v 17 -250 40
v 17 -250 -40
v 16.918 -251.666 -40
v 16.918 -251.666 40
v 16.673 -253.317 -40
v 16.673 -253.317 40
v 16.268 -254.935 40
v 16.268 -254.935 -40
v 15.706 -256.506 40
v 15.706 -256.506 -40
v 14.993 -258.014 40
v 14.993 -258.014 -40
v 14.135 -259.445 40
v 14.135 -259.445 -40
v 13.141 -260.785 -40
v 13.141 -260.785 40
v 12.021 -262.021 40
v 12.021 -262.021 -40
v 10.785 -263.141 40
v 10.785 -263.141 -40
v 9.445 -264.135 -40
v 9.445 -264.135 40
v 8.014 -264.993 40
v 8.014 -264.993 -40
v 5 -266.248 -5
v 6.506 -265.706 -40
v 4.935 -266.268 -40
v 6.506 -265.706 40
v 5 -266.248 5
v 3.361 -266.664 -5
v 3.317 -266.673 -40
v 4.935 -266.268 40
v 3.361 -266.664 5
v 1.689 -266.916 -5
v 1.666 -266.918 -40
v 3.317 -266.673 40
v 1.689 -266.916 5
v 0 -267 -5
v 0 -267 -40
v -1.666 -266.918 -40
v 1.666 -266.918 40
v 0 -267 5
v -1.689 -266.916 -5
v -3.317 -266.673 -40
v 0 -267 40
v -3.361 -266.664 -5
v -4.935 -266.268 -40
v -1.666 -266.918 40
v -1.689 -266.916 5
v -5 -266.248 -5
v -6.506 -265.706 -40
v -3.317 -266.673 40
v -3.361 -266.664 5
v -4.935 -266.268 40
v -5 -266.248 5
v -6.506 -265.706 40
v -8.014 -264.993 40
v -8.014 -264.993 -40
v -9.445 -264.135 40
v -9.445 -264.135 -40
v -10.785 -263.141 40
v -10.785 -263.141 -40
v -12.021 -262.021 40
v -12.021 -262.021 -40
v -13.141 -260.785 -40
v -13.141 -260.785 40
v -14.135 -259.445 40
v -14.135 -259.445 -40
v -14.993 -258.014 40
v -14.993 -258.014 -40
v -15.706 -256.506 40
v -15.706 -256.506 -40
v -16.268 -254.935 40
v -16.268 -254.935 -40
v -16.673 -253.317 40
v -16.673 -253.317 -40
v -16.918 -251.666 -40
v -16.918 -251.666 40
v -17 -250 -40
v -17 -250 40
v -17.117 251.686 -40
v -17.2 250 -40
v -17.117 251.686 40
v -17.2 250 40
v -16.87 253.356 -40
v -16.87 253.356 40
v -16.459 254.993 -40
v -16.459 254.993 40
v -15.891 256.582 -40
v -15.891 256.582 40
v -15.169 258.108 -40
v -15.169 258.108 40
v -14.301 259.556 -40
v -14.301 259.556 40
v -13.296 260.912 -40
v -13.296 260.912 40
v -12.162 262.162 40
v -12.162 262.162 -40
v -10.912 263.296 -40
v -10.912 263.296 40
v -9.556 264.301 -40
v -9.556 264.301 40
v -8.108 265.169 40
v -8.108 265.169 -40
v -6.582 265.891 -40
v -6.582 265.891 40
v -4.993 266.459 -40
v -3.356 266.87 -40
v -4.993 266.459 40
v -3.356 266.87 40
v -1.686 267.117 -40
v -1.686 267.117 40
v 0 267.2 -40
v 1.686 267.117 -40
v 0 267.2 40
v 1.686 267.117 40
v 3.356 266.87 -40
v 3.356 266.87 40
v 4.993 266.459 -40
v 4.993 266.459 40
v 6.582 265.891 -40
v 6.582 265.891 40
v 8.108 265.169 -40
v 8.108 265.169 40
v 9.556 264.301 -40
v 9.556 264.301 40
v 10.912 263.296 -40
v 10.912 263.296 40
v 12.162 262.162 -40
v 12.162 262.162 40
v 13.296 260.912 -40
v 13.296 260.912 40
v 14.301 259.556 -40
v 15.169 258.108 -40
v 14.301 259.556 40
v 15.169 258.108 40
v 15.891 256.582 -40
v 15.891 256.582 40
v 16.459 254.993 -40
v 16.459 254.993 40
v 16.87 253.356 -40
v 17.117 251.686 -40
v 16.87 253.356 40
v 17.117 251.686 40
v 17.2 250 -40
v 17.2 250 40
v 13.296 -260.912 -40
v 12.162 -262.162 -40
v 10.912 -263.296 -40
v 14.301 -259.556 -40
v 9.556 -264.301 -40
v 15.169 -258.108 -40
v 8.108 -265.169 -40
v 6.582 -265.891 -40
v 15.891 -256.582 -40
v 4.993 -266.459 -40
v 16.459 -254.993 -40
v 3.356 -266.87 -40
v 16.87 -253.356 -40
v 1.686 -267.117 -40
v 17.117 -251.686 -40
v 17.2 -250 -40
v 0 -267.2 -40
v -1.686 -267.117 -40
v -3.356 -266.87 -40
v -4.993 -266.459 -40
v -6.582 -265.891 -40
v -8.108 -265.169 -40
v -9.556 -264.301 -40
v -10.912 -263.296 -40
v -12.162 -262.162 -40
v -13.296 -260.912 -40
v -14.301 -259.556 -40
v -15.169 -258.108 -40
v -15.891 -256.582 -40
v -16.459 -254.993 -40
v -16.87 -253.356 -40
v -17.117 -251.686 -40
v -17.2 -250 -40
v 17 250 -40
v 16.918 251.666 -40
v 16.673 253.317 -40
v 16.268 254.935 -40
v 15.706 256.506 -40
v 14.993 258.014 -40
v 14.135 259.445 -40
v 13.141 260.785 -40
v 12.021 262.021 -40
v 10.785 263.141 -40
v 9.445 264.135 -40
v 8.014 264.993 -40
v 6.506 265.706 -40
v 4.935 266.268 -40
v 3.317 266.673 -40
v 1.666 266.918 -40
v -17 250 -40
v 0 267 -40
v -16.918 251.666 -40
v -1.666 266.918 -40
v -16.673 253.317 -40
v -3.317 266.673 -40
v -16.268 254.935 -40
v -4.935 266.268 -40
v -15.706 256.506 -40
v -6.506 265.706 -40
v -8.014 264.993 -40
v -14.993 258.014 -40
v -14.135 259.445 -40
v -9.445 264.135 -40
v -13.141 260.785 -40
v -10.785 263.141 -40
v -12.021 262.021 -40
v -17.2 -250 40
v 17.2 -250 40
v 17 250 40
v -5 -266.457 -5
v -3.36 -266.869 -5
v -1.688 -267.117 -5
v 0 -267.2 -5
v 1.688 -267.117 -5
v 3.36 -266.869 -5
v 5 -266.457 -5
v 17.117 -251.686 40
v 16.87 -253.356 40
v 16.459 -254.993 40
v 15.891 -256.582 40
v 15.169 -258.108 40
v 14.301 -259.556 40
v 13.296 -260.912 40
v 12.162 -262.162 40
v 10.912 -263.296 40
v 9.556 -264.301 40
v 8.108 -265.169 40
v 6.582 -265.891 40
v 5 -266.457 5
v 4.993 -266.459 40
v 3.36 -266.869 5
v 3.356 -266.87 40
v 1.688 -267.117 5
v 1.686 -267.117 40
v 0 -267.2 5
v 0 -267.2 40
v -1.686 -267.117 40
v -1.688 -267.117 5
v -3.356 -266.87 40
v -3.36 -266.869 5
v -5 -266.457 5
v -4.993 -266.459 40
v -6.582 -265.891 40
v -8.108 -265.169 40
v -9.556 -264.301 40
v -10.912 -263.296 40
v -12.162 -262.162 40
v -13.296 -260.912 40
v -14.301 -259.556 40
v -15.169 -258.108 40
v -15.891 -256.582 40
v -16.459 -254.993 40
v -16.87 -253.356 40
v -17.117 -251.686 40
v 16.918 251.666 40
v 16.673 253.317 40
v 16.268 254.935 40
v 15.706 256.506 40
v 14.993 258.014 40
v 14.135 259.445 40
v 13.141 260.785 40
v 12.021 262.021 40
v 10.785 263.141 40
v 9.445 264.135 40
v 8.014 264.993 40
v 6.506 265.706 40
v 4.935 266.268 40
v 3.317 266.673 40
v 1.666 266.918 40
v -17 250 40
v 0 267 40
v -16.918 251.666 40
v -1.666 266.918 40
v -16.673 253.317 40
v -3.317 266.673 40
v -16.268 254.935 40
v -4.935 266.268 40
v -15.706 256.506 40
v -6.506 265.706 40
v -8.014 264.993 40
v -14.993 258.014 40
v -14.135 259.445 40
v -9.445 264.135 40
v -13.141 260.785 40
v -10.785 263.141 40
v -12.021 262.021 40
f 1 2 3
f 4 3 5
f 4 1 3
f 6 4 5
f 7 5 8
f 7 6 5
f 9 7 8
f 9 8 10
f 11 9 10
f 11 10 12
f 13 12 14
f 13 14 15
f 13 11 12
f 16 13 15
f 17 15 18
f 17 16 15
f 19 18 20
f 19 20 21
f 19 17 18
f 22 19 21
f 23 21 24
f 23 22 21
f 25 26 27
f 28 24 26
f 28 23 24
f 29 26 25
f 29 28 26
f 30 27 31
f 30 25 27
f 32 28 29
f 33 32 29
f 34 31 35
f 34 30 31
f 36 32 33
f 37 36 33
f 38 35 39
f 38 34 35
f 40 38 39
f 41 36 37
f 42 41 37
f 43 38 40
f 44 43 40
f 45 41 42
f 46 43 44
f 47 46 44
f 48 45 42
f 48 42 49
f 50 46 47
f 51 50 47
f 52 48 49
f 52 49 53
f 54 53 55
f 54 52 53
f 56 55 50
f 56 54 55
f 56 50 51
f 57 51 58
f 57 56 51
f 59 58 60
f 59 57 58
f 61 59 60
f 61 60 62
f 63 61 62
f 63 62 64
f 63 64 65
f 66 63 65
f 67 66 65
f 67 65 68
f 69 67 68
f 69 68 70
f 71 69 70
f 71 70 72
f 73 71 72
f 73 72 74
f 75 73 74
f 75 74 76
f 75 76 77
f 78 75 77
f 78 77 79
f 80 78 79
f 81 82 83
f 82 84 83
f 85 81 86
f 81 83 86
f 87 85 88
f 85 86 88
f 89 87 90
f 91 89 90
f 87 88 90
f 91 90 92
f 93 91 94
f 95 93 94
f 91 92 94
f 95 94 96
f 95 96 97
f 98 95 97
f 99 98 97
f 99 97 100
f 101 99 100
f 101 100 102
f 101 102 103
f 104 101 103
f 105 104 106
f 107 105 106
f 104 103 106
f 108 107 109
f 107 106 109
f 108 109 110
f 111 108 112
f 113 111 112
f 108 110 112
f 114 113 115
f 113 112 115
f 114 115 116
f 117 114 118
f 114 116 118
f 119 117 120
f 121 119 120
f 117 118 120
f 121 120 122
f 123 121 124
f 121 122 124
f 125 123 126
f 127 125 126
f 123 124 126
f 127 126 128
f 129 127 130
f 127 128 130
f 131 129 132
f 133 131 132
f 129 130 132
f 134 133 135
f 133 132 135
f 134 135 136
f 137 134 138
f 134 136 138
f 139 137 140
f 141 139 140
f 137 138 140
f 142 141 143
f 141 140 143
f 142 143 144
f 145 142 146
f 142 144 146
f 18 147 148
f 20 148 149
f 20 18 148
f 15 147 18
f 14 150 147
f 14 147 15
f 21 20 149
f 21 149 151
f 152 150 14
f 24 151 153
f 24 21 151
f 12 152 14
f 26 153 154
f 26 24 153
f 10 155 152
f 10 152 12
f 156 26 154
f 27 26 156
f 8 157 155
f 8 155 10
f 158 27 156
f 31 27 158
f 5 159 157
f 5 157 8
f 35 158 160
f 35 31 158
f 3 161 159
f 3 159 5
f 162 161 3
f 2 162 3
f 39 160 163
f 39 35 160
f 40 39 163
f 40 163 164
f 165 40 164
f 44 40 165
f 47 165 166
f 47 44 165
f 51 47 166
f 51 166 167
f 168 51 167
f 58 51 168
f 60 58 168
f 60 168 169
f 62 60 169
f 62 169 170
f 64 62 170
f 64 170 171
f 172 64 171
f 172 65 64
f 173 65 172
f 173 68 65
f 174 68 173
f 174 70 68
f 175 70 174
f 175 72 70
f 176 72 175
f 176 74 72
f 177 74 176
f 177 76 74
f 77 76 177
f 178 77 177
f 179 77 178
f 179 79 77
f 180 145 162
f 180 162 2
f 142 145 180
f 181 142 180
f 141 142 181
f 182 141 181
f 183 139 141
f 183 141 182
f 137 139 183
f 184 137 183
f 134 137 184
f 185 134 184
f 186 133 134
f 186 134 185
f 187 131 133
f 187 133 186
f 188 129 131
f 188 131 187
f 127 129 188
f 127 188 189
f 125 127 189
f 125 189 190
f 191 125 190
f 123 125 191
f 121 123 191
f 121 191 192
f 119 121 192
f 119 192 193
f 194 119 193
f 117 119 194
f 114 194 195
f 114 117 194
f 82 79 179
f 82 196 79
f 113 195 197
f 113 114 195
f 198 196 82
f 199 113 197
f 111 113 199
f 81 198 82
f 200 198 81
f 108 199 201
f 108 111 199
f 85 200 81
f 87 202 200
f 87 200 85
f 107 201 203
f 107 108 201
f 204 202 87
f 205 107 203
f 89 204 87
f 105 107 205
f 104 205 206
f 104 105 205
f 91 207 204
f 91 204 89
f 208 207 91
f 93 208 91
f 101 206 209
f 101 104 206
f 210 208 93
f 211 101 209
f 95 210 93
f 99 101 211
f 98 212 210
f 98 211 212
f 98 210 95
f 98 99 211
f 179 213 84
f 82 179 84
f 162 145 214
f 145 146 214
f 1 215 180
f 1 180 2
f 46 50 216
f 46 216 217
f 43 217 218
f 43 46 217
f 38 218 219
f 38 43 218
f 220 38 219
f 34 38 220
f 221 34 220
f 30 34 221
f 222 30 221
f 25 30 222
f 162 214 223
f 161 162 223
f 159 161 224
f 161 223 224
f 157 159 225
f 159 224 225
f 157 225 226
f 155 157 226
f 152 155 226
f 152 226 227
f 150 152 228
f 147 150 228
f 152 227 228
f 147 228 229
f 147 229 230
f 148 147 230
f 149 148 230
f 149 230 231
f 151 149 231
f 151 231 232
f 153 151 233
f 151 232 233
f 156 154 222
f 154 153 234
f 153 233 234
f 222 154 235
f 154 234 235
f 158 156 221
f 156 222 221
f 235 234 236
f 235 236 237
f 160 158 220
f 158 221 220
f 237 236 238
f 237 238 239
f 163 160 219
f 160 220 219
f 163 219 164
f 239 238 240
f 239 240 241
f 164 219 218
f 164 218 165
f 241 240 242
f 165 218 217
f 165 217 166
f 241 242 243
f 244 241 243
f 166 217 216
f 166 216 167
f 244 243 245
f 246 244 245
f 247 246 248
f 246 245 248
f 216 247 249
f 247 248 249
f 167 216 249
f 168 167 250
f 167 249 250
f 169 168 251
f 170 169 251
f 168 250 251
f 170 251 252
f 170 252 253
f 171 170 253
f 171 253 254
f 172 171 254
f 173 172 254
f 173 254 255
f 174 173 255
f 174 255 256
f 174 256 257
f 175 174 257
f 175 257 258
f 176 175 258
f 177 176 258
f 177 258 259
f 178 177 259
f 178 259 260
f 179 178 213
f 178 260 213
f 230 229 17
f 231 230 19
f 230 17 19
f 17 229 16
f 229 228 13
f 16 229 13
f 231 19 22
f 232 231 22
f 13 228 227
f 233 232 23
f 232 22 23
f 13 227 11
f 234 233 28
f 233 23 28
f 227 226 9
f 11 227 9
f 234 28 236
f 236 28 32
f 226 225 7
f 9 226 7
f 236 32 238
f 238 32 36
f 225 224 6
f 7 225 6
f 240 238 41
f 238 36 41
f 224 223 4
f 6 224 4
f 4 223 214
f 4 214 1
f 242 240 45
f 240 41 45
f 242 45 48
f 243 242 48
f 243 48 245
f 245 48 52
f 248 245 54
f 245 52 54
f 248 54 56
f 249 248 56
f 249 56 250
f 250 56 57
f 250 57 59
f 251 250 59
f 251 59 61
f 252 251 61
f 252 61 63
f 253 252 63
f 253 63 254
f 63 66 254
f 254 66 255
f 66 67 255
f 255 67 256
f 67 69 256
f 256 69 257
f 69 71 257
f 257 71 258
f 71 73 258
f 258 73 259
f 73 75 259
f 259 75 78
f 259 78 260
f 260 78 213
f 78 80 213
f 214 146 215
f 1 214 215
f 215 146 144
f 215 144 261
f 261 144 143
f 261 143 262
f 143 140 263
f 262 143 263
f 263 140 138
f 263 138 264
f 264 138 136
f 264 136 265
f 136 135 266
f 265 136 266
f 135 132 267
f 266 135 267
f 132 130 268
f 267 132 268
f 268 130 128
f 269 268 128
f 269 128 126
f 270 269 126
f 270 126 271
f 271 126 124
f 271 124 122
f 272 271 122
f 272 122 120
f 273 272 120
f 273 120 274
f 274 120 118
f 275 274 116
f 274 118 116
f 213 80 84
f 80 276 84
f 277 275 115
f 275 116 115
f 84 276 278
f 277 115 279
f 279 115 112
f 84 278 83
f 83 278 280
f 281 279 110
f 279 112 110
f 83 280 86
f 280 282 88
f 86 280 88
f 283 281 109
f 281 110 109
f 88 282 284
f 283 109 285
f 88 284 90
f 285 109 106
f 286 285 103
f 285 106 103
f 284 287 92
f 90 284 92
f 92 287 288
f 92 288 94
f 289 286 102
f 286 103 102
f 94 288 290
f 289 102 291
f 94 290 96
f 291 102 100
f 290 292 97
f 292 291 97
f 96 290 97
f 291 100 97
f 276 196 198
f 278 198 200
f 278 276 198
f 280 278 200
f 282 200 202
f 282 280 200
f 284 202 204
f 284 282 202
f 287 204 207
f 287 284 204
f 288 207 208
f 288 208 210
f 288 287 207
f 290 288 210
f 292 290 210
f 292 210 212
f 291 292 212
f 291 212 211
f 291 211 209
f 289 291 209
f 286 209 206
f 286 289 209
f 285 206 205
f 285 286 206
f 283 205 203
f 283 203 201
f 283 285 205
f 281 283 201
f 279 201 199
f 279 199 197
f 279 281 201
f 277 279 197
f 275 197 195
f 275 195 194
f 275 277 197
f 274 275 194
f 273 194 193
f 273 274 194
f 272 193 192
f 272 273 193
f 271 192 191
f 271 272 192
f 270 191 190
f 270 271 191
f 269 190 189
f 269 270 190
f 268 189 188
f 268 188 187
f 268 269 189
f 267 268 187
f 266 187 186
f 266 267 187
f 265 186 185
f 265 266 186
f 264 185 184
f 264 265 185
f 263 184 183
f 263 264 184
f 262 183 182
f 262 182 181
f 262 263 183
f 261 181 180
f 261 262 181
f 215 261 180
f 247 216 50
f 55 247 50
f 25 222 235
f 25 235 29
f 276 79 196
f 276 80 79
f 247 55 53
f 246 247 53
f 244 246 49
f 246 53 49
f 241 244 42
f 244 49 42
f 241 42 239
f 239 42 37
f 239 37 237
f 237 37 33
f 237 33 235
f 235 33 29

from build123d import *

# Parameters (mm, degrees)
BOSS_EXTRUDE1_DEPTH = 40
SKETCH3_W           = 10
SKETCH3_H           = 10
CUT_EXTRUDE1_DEPTH  = 5


with BuildPart() as part:
    # Sketch1 → Boss-Extrude1 (new, symmetric)
    with BuildSketch(Plane.XY):
        with BuildLine():
            Line((-17.2, -250), (-17.2, 250))
            ThreePointArc((-17.2, 250), (0, 267.2), (17.2, 250))
            Line((17.2, 250), (17.2, -250))
            ThreePointArc((17.2, -250), (0, -267.2), (-17.2, -250))
        make_face()
        with BuildLine():
            Line((-17, -250), (-17, 250))
            ThreePointArc((-17, 250), (0, 267), (17, 250))
            Line((17, 250), (17, -250))
            ThreePointArc((17, -250), (0, -267), (-17, -250))
        make_face(mode=Mode.SUBTRACT)
    extrude(amount=BOSS_EXTRUDE1_DEPTH, both=True)

    # Sketch3 → Cut-Extrude1 (cut, symmetric)
    with BuildSketch(Plane.XY):
        with Locations((0, -267)):
            Rectangle(SKETCH3_W, SKETCH3_H)
    extrude(amount=CUT_EXTRUDE1_DEPTH, both=True, mode=Mode.SUBTRACT)


solid = part.part
